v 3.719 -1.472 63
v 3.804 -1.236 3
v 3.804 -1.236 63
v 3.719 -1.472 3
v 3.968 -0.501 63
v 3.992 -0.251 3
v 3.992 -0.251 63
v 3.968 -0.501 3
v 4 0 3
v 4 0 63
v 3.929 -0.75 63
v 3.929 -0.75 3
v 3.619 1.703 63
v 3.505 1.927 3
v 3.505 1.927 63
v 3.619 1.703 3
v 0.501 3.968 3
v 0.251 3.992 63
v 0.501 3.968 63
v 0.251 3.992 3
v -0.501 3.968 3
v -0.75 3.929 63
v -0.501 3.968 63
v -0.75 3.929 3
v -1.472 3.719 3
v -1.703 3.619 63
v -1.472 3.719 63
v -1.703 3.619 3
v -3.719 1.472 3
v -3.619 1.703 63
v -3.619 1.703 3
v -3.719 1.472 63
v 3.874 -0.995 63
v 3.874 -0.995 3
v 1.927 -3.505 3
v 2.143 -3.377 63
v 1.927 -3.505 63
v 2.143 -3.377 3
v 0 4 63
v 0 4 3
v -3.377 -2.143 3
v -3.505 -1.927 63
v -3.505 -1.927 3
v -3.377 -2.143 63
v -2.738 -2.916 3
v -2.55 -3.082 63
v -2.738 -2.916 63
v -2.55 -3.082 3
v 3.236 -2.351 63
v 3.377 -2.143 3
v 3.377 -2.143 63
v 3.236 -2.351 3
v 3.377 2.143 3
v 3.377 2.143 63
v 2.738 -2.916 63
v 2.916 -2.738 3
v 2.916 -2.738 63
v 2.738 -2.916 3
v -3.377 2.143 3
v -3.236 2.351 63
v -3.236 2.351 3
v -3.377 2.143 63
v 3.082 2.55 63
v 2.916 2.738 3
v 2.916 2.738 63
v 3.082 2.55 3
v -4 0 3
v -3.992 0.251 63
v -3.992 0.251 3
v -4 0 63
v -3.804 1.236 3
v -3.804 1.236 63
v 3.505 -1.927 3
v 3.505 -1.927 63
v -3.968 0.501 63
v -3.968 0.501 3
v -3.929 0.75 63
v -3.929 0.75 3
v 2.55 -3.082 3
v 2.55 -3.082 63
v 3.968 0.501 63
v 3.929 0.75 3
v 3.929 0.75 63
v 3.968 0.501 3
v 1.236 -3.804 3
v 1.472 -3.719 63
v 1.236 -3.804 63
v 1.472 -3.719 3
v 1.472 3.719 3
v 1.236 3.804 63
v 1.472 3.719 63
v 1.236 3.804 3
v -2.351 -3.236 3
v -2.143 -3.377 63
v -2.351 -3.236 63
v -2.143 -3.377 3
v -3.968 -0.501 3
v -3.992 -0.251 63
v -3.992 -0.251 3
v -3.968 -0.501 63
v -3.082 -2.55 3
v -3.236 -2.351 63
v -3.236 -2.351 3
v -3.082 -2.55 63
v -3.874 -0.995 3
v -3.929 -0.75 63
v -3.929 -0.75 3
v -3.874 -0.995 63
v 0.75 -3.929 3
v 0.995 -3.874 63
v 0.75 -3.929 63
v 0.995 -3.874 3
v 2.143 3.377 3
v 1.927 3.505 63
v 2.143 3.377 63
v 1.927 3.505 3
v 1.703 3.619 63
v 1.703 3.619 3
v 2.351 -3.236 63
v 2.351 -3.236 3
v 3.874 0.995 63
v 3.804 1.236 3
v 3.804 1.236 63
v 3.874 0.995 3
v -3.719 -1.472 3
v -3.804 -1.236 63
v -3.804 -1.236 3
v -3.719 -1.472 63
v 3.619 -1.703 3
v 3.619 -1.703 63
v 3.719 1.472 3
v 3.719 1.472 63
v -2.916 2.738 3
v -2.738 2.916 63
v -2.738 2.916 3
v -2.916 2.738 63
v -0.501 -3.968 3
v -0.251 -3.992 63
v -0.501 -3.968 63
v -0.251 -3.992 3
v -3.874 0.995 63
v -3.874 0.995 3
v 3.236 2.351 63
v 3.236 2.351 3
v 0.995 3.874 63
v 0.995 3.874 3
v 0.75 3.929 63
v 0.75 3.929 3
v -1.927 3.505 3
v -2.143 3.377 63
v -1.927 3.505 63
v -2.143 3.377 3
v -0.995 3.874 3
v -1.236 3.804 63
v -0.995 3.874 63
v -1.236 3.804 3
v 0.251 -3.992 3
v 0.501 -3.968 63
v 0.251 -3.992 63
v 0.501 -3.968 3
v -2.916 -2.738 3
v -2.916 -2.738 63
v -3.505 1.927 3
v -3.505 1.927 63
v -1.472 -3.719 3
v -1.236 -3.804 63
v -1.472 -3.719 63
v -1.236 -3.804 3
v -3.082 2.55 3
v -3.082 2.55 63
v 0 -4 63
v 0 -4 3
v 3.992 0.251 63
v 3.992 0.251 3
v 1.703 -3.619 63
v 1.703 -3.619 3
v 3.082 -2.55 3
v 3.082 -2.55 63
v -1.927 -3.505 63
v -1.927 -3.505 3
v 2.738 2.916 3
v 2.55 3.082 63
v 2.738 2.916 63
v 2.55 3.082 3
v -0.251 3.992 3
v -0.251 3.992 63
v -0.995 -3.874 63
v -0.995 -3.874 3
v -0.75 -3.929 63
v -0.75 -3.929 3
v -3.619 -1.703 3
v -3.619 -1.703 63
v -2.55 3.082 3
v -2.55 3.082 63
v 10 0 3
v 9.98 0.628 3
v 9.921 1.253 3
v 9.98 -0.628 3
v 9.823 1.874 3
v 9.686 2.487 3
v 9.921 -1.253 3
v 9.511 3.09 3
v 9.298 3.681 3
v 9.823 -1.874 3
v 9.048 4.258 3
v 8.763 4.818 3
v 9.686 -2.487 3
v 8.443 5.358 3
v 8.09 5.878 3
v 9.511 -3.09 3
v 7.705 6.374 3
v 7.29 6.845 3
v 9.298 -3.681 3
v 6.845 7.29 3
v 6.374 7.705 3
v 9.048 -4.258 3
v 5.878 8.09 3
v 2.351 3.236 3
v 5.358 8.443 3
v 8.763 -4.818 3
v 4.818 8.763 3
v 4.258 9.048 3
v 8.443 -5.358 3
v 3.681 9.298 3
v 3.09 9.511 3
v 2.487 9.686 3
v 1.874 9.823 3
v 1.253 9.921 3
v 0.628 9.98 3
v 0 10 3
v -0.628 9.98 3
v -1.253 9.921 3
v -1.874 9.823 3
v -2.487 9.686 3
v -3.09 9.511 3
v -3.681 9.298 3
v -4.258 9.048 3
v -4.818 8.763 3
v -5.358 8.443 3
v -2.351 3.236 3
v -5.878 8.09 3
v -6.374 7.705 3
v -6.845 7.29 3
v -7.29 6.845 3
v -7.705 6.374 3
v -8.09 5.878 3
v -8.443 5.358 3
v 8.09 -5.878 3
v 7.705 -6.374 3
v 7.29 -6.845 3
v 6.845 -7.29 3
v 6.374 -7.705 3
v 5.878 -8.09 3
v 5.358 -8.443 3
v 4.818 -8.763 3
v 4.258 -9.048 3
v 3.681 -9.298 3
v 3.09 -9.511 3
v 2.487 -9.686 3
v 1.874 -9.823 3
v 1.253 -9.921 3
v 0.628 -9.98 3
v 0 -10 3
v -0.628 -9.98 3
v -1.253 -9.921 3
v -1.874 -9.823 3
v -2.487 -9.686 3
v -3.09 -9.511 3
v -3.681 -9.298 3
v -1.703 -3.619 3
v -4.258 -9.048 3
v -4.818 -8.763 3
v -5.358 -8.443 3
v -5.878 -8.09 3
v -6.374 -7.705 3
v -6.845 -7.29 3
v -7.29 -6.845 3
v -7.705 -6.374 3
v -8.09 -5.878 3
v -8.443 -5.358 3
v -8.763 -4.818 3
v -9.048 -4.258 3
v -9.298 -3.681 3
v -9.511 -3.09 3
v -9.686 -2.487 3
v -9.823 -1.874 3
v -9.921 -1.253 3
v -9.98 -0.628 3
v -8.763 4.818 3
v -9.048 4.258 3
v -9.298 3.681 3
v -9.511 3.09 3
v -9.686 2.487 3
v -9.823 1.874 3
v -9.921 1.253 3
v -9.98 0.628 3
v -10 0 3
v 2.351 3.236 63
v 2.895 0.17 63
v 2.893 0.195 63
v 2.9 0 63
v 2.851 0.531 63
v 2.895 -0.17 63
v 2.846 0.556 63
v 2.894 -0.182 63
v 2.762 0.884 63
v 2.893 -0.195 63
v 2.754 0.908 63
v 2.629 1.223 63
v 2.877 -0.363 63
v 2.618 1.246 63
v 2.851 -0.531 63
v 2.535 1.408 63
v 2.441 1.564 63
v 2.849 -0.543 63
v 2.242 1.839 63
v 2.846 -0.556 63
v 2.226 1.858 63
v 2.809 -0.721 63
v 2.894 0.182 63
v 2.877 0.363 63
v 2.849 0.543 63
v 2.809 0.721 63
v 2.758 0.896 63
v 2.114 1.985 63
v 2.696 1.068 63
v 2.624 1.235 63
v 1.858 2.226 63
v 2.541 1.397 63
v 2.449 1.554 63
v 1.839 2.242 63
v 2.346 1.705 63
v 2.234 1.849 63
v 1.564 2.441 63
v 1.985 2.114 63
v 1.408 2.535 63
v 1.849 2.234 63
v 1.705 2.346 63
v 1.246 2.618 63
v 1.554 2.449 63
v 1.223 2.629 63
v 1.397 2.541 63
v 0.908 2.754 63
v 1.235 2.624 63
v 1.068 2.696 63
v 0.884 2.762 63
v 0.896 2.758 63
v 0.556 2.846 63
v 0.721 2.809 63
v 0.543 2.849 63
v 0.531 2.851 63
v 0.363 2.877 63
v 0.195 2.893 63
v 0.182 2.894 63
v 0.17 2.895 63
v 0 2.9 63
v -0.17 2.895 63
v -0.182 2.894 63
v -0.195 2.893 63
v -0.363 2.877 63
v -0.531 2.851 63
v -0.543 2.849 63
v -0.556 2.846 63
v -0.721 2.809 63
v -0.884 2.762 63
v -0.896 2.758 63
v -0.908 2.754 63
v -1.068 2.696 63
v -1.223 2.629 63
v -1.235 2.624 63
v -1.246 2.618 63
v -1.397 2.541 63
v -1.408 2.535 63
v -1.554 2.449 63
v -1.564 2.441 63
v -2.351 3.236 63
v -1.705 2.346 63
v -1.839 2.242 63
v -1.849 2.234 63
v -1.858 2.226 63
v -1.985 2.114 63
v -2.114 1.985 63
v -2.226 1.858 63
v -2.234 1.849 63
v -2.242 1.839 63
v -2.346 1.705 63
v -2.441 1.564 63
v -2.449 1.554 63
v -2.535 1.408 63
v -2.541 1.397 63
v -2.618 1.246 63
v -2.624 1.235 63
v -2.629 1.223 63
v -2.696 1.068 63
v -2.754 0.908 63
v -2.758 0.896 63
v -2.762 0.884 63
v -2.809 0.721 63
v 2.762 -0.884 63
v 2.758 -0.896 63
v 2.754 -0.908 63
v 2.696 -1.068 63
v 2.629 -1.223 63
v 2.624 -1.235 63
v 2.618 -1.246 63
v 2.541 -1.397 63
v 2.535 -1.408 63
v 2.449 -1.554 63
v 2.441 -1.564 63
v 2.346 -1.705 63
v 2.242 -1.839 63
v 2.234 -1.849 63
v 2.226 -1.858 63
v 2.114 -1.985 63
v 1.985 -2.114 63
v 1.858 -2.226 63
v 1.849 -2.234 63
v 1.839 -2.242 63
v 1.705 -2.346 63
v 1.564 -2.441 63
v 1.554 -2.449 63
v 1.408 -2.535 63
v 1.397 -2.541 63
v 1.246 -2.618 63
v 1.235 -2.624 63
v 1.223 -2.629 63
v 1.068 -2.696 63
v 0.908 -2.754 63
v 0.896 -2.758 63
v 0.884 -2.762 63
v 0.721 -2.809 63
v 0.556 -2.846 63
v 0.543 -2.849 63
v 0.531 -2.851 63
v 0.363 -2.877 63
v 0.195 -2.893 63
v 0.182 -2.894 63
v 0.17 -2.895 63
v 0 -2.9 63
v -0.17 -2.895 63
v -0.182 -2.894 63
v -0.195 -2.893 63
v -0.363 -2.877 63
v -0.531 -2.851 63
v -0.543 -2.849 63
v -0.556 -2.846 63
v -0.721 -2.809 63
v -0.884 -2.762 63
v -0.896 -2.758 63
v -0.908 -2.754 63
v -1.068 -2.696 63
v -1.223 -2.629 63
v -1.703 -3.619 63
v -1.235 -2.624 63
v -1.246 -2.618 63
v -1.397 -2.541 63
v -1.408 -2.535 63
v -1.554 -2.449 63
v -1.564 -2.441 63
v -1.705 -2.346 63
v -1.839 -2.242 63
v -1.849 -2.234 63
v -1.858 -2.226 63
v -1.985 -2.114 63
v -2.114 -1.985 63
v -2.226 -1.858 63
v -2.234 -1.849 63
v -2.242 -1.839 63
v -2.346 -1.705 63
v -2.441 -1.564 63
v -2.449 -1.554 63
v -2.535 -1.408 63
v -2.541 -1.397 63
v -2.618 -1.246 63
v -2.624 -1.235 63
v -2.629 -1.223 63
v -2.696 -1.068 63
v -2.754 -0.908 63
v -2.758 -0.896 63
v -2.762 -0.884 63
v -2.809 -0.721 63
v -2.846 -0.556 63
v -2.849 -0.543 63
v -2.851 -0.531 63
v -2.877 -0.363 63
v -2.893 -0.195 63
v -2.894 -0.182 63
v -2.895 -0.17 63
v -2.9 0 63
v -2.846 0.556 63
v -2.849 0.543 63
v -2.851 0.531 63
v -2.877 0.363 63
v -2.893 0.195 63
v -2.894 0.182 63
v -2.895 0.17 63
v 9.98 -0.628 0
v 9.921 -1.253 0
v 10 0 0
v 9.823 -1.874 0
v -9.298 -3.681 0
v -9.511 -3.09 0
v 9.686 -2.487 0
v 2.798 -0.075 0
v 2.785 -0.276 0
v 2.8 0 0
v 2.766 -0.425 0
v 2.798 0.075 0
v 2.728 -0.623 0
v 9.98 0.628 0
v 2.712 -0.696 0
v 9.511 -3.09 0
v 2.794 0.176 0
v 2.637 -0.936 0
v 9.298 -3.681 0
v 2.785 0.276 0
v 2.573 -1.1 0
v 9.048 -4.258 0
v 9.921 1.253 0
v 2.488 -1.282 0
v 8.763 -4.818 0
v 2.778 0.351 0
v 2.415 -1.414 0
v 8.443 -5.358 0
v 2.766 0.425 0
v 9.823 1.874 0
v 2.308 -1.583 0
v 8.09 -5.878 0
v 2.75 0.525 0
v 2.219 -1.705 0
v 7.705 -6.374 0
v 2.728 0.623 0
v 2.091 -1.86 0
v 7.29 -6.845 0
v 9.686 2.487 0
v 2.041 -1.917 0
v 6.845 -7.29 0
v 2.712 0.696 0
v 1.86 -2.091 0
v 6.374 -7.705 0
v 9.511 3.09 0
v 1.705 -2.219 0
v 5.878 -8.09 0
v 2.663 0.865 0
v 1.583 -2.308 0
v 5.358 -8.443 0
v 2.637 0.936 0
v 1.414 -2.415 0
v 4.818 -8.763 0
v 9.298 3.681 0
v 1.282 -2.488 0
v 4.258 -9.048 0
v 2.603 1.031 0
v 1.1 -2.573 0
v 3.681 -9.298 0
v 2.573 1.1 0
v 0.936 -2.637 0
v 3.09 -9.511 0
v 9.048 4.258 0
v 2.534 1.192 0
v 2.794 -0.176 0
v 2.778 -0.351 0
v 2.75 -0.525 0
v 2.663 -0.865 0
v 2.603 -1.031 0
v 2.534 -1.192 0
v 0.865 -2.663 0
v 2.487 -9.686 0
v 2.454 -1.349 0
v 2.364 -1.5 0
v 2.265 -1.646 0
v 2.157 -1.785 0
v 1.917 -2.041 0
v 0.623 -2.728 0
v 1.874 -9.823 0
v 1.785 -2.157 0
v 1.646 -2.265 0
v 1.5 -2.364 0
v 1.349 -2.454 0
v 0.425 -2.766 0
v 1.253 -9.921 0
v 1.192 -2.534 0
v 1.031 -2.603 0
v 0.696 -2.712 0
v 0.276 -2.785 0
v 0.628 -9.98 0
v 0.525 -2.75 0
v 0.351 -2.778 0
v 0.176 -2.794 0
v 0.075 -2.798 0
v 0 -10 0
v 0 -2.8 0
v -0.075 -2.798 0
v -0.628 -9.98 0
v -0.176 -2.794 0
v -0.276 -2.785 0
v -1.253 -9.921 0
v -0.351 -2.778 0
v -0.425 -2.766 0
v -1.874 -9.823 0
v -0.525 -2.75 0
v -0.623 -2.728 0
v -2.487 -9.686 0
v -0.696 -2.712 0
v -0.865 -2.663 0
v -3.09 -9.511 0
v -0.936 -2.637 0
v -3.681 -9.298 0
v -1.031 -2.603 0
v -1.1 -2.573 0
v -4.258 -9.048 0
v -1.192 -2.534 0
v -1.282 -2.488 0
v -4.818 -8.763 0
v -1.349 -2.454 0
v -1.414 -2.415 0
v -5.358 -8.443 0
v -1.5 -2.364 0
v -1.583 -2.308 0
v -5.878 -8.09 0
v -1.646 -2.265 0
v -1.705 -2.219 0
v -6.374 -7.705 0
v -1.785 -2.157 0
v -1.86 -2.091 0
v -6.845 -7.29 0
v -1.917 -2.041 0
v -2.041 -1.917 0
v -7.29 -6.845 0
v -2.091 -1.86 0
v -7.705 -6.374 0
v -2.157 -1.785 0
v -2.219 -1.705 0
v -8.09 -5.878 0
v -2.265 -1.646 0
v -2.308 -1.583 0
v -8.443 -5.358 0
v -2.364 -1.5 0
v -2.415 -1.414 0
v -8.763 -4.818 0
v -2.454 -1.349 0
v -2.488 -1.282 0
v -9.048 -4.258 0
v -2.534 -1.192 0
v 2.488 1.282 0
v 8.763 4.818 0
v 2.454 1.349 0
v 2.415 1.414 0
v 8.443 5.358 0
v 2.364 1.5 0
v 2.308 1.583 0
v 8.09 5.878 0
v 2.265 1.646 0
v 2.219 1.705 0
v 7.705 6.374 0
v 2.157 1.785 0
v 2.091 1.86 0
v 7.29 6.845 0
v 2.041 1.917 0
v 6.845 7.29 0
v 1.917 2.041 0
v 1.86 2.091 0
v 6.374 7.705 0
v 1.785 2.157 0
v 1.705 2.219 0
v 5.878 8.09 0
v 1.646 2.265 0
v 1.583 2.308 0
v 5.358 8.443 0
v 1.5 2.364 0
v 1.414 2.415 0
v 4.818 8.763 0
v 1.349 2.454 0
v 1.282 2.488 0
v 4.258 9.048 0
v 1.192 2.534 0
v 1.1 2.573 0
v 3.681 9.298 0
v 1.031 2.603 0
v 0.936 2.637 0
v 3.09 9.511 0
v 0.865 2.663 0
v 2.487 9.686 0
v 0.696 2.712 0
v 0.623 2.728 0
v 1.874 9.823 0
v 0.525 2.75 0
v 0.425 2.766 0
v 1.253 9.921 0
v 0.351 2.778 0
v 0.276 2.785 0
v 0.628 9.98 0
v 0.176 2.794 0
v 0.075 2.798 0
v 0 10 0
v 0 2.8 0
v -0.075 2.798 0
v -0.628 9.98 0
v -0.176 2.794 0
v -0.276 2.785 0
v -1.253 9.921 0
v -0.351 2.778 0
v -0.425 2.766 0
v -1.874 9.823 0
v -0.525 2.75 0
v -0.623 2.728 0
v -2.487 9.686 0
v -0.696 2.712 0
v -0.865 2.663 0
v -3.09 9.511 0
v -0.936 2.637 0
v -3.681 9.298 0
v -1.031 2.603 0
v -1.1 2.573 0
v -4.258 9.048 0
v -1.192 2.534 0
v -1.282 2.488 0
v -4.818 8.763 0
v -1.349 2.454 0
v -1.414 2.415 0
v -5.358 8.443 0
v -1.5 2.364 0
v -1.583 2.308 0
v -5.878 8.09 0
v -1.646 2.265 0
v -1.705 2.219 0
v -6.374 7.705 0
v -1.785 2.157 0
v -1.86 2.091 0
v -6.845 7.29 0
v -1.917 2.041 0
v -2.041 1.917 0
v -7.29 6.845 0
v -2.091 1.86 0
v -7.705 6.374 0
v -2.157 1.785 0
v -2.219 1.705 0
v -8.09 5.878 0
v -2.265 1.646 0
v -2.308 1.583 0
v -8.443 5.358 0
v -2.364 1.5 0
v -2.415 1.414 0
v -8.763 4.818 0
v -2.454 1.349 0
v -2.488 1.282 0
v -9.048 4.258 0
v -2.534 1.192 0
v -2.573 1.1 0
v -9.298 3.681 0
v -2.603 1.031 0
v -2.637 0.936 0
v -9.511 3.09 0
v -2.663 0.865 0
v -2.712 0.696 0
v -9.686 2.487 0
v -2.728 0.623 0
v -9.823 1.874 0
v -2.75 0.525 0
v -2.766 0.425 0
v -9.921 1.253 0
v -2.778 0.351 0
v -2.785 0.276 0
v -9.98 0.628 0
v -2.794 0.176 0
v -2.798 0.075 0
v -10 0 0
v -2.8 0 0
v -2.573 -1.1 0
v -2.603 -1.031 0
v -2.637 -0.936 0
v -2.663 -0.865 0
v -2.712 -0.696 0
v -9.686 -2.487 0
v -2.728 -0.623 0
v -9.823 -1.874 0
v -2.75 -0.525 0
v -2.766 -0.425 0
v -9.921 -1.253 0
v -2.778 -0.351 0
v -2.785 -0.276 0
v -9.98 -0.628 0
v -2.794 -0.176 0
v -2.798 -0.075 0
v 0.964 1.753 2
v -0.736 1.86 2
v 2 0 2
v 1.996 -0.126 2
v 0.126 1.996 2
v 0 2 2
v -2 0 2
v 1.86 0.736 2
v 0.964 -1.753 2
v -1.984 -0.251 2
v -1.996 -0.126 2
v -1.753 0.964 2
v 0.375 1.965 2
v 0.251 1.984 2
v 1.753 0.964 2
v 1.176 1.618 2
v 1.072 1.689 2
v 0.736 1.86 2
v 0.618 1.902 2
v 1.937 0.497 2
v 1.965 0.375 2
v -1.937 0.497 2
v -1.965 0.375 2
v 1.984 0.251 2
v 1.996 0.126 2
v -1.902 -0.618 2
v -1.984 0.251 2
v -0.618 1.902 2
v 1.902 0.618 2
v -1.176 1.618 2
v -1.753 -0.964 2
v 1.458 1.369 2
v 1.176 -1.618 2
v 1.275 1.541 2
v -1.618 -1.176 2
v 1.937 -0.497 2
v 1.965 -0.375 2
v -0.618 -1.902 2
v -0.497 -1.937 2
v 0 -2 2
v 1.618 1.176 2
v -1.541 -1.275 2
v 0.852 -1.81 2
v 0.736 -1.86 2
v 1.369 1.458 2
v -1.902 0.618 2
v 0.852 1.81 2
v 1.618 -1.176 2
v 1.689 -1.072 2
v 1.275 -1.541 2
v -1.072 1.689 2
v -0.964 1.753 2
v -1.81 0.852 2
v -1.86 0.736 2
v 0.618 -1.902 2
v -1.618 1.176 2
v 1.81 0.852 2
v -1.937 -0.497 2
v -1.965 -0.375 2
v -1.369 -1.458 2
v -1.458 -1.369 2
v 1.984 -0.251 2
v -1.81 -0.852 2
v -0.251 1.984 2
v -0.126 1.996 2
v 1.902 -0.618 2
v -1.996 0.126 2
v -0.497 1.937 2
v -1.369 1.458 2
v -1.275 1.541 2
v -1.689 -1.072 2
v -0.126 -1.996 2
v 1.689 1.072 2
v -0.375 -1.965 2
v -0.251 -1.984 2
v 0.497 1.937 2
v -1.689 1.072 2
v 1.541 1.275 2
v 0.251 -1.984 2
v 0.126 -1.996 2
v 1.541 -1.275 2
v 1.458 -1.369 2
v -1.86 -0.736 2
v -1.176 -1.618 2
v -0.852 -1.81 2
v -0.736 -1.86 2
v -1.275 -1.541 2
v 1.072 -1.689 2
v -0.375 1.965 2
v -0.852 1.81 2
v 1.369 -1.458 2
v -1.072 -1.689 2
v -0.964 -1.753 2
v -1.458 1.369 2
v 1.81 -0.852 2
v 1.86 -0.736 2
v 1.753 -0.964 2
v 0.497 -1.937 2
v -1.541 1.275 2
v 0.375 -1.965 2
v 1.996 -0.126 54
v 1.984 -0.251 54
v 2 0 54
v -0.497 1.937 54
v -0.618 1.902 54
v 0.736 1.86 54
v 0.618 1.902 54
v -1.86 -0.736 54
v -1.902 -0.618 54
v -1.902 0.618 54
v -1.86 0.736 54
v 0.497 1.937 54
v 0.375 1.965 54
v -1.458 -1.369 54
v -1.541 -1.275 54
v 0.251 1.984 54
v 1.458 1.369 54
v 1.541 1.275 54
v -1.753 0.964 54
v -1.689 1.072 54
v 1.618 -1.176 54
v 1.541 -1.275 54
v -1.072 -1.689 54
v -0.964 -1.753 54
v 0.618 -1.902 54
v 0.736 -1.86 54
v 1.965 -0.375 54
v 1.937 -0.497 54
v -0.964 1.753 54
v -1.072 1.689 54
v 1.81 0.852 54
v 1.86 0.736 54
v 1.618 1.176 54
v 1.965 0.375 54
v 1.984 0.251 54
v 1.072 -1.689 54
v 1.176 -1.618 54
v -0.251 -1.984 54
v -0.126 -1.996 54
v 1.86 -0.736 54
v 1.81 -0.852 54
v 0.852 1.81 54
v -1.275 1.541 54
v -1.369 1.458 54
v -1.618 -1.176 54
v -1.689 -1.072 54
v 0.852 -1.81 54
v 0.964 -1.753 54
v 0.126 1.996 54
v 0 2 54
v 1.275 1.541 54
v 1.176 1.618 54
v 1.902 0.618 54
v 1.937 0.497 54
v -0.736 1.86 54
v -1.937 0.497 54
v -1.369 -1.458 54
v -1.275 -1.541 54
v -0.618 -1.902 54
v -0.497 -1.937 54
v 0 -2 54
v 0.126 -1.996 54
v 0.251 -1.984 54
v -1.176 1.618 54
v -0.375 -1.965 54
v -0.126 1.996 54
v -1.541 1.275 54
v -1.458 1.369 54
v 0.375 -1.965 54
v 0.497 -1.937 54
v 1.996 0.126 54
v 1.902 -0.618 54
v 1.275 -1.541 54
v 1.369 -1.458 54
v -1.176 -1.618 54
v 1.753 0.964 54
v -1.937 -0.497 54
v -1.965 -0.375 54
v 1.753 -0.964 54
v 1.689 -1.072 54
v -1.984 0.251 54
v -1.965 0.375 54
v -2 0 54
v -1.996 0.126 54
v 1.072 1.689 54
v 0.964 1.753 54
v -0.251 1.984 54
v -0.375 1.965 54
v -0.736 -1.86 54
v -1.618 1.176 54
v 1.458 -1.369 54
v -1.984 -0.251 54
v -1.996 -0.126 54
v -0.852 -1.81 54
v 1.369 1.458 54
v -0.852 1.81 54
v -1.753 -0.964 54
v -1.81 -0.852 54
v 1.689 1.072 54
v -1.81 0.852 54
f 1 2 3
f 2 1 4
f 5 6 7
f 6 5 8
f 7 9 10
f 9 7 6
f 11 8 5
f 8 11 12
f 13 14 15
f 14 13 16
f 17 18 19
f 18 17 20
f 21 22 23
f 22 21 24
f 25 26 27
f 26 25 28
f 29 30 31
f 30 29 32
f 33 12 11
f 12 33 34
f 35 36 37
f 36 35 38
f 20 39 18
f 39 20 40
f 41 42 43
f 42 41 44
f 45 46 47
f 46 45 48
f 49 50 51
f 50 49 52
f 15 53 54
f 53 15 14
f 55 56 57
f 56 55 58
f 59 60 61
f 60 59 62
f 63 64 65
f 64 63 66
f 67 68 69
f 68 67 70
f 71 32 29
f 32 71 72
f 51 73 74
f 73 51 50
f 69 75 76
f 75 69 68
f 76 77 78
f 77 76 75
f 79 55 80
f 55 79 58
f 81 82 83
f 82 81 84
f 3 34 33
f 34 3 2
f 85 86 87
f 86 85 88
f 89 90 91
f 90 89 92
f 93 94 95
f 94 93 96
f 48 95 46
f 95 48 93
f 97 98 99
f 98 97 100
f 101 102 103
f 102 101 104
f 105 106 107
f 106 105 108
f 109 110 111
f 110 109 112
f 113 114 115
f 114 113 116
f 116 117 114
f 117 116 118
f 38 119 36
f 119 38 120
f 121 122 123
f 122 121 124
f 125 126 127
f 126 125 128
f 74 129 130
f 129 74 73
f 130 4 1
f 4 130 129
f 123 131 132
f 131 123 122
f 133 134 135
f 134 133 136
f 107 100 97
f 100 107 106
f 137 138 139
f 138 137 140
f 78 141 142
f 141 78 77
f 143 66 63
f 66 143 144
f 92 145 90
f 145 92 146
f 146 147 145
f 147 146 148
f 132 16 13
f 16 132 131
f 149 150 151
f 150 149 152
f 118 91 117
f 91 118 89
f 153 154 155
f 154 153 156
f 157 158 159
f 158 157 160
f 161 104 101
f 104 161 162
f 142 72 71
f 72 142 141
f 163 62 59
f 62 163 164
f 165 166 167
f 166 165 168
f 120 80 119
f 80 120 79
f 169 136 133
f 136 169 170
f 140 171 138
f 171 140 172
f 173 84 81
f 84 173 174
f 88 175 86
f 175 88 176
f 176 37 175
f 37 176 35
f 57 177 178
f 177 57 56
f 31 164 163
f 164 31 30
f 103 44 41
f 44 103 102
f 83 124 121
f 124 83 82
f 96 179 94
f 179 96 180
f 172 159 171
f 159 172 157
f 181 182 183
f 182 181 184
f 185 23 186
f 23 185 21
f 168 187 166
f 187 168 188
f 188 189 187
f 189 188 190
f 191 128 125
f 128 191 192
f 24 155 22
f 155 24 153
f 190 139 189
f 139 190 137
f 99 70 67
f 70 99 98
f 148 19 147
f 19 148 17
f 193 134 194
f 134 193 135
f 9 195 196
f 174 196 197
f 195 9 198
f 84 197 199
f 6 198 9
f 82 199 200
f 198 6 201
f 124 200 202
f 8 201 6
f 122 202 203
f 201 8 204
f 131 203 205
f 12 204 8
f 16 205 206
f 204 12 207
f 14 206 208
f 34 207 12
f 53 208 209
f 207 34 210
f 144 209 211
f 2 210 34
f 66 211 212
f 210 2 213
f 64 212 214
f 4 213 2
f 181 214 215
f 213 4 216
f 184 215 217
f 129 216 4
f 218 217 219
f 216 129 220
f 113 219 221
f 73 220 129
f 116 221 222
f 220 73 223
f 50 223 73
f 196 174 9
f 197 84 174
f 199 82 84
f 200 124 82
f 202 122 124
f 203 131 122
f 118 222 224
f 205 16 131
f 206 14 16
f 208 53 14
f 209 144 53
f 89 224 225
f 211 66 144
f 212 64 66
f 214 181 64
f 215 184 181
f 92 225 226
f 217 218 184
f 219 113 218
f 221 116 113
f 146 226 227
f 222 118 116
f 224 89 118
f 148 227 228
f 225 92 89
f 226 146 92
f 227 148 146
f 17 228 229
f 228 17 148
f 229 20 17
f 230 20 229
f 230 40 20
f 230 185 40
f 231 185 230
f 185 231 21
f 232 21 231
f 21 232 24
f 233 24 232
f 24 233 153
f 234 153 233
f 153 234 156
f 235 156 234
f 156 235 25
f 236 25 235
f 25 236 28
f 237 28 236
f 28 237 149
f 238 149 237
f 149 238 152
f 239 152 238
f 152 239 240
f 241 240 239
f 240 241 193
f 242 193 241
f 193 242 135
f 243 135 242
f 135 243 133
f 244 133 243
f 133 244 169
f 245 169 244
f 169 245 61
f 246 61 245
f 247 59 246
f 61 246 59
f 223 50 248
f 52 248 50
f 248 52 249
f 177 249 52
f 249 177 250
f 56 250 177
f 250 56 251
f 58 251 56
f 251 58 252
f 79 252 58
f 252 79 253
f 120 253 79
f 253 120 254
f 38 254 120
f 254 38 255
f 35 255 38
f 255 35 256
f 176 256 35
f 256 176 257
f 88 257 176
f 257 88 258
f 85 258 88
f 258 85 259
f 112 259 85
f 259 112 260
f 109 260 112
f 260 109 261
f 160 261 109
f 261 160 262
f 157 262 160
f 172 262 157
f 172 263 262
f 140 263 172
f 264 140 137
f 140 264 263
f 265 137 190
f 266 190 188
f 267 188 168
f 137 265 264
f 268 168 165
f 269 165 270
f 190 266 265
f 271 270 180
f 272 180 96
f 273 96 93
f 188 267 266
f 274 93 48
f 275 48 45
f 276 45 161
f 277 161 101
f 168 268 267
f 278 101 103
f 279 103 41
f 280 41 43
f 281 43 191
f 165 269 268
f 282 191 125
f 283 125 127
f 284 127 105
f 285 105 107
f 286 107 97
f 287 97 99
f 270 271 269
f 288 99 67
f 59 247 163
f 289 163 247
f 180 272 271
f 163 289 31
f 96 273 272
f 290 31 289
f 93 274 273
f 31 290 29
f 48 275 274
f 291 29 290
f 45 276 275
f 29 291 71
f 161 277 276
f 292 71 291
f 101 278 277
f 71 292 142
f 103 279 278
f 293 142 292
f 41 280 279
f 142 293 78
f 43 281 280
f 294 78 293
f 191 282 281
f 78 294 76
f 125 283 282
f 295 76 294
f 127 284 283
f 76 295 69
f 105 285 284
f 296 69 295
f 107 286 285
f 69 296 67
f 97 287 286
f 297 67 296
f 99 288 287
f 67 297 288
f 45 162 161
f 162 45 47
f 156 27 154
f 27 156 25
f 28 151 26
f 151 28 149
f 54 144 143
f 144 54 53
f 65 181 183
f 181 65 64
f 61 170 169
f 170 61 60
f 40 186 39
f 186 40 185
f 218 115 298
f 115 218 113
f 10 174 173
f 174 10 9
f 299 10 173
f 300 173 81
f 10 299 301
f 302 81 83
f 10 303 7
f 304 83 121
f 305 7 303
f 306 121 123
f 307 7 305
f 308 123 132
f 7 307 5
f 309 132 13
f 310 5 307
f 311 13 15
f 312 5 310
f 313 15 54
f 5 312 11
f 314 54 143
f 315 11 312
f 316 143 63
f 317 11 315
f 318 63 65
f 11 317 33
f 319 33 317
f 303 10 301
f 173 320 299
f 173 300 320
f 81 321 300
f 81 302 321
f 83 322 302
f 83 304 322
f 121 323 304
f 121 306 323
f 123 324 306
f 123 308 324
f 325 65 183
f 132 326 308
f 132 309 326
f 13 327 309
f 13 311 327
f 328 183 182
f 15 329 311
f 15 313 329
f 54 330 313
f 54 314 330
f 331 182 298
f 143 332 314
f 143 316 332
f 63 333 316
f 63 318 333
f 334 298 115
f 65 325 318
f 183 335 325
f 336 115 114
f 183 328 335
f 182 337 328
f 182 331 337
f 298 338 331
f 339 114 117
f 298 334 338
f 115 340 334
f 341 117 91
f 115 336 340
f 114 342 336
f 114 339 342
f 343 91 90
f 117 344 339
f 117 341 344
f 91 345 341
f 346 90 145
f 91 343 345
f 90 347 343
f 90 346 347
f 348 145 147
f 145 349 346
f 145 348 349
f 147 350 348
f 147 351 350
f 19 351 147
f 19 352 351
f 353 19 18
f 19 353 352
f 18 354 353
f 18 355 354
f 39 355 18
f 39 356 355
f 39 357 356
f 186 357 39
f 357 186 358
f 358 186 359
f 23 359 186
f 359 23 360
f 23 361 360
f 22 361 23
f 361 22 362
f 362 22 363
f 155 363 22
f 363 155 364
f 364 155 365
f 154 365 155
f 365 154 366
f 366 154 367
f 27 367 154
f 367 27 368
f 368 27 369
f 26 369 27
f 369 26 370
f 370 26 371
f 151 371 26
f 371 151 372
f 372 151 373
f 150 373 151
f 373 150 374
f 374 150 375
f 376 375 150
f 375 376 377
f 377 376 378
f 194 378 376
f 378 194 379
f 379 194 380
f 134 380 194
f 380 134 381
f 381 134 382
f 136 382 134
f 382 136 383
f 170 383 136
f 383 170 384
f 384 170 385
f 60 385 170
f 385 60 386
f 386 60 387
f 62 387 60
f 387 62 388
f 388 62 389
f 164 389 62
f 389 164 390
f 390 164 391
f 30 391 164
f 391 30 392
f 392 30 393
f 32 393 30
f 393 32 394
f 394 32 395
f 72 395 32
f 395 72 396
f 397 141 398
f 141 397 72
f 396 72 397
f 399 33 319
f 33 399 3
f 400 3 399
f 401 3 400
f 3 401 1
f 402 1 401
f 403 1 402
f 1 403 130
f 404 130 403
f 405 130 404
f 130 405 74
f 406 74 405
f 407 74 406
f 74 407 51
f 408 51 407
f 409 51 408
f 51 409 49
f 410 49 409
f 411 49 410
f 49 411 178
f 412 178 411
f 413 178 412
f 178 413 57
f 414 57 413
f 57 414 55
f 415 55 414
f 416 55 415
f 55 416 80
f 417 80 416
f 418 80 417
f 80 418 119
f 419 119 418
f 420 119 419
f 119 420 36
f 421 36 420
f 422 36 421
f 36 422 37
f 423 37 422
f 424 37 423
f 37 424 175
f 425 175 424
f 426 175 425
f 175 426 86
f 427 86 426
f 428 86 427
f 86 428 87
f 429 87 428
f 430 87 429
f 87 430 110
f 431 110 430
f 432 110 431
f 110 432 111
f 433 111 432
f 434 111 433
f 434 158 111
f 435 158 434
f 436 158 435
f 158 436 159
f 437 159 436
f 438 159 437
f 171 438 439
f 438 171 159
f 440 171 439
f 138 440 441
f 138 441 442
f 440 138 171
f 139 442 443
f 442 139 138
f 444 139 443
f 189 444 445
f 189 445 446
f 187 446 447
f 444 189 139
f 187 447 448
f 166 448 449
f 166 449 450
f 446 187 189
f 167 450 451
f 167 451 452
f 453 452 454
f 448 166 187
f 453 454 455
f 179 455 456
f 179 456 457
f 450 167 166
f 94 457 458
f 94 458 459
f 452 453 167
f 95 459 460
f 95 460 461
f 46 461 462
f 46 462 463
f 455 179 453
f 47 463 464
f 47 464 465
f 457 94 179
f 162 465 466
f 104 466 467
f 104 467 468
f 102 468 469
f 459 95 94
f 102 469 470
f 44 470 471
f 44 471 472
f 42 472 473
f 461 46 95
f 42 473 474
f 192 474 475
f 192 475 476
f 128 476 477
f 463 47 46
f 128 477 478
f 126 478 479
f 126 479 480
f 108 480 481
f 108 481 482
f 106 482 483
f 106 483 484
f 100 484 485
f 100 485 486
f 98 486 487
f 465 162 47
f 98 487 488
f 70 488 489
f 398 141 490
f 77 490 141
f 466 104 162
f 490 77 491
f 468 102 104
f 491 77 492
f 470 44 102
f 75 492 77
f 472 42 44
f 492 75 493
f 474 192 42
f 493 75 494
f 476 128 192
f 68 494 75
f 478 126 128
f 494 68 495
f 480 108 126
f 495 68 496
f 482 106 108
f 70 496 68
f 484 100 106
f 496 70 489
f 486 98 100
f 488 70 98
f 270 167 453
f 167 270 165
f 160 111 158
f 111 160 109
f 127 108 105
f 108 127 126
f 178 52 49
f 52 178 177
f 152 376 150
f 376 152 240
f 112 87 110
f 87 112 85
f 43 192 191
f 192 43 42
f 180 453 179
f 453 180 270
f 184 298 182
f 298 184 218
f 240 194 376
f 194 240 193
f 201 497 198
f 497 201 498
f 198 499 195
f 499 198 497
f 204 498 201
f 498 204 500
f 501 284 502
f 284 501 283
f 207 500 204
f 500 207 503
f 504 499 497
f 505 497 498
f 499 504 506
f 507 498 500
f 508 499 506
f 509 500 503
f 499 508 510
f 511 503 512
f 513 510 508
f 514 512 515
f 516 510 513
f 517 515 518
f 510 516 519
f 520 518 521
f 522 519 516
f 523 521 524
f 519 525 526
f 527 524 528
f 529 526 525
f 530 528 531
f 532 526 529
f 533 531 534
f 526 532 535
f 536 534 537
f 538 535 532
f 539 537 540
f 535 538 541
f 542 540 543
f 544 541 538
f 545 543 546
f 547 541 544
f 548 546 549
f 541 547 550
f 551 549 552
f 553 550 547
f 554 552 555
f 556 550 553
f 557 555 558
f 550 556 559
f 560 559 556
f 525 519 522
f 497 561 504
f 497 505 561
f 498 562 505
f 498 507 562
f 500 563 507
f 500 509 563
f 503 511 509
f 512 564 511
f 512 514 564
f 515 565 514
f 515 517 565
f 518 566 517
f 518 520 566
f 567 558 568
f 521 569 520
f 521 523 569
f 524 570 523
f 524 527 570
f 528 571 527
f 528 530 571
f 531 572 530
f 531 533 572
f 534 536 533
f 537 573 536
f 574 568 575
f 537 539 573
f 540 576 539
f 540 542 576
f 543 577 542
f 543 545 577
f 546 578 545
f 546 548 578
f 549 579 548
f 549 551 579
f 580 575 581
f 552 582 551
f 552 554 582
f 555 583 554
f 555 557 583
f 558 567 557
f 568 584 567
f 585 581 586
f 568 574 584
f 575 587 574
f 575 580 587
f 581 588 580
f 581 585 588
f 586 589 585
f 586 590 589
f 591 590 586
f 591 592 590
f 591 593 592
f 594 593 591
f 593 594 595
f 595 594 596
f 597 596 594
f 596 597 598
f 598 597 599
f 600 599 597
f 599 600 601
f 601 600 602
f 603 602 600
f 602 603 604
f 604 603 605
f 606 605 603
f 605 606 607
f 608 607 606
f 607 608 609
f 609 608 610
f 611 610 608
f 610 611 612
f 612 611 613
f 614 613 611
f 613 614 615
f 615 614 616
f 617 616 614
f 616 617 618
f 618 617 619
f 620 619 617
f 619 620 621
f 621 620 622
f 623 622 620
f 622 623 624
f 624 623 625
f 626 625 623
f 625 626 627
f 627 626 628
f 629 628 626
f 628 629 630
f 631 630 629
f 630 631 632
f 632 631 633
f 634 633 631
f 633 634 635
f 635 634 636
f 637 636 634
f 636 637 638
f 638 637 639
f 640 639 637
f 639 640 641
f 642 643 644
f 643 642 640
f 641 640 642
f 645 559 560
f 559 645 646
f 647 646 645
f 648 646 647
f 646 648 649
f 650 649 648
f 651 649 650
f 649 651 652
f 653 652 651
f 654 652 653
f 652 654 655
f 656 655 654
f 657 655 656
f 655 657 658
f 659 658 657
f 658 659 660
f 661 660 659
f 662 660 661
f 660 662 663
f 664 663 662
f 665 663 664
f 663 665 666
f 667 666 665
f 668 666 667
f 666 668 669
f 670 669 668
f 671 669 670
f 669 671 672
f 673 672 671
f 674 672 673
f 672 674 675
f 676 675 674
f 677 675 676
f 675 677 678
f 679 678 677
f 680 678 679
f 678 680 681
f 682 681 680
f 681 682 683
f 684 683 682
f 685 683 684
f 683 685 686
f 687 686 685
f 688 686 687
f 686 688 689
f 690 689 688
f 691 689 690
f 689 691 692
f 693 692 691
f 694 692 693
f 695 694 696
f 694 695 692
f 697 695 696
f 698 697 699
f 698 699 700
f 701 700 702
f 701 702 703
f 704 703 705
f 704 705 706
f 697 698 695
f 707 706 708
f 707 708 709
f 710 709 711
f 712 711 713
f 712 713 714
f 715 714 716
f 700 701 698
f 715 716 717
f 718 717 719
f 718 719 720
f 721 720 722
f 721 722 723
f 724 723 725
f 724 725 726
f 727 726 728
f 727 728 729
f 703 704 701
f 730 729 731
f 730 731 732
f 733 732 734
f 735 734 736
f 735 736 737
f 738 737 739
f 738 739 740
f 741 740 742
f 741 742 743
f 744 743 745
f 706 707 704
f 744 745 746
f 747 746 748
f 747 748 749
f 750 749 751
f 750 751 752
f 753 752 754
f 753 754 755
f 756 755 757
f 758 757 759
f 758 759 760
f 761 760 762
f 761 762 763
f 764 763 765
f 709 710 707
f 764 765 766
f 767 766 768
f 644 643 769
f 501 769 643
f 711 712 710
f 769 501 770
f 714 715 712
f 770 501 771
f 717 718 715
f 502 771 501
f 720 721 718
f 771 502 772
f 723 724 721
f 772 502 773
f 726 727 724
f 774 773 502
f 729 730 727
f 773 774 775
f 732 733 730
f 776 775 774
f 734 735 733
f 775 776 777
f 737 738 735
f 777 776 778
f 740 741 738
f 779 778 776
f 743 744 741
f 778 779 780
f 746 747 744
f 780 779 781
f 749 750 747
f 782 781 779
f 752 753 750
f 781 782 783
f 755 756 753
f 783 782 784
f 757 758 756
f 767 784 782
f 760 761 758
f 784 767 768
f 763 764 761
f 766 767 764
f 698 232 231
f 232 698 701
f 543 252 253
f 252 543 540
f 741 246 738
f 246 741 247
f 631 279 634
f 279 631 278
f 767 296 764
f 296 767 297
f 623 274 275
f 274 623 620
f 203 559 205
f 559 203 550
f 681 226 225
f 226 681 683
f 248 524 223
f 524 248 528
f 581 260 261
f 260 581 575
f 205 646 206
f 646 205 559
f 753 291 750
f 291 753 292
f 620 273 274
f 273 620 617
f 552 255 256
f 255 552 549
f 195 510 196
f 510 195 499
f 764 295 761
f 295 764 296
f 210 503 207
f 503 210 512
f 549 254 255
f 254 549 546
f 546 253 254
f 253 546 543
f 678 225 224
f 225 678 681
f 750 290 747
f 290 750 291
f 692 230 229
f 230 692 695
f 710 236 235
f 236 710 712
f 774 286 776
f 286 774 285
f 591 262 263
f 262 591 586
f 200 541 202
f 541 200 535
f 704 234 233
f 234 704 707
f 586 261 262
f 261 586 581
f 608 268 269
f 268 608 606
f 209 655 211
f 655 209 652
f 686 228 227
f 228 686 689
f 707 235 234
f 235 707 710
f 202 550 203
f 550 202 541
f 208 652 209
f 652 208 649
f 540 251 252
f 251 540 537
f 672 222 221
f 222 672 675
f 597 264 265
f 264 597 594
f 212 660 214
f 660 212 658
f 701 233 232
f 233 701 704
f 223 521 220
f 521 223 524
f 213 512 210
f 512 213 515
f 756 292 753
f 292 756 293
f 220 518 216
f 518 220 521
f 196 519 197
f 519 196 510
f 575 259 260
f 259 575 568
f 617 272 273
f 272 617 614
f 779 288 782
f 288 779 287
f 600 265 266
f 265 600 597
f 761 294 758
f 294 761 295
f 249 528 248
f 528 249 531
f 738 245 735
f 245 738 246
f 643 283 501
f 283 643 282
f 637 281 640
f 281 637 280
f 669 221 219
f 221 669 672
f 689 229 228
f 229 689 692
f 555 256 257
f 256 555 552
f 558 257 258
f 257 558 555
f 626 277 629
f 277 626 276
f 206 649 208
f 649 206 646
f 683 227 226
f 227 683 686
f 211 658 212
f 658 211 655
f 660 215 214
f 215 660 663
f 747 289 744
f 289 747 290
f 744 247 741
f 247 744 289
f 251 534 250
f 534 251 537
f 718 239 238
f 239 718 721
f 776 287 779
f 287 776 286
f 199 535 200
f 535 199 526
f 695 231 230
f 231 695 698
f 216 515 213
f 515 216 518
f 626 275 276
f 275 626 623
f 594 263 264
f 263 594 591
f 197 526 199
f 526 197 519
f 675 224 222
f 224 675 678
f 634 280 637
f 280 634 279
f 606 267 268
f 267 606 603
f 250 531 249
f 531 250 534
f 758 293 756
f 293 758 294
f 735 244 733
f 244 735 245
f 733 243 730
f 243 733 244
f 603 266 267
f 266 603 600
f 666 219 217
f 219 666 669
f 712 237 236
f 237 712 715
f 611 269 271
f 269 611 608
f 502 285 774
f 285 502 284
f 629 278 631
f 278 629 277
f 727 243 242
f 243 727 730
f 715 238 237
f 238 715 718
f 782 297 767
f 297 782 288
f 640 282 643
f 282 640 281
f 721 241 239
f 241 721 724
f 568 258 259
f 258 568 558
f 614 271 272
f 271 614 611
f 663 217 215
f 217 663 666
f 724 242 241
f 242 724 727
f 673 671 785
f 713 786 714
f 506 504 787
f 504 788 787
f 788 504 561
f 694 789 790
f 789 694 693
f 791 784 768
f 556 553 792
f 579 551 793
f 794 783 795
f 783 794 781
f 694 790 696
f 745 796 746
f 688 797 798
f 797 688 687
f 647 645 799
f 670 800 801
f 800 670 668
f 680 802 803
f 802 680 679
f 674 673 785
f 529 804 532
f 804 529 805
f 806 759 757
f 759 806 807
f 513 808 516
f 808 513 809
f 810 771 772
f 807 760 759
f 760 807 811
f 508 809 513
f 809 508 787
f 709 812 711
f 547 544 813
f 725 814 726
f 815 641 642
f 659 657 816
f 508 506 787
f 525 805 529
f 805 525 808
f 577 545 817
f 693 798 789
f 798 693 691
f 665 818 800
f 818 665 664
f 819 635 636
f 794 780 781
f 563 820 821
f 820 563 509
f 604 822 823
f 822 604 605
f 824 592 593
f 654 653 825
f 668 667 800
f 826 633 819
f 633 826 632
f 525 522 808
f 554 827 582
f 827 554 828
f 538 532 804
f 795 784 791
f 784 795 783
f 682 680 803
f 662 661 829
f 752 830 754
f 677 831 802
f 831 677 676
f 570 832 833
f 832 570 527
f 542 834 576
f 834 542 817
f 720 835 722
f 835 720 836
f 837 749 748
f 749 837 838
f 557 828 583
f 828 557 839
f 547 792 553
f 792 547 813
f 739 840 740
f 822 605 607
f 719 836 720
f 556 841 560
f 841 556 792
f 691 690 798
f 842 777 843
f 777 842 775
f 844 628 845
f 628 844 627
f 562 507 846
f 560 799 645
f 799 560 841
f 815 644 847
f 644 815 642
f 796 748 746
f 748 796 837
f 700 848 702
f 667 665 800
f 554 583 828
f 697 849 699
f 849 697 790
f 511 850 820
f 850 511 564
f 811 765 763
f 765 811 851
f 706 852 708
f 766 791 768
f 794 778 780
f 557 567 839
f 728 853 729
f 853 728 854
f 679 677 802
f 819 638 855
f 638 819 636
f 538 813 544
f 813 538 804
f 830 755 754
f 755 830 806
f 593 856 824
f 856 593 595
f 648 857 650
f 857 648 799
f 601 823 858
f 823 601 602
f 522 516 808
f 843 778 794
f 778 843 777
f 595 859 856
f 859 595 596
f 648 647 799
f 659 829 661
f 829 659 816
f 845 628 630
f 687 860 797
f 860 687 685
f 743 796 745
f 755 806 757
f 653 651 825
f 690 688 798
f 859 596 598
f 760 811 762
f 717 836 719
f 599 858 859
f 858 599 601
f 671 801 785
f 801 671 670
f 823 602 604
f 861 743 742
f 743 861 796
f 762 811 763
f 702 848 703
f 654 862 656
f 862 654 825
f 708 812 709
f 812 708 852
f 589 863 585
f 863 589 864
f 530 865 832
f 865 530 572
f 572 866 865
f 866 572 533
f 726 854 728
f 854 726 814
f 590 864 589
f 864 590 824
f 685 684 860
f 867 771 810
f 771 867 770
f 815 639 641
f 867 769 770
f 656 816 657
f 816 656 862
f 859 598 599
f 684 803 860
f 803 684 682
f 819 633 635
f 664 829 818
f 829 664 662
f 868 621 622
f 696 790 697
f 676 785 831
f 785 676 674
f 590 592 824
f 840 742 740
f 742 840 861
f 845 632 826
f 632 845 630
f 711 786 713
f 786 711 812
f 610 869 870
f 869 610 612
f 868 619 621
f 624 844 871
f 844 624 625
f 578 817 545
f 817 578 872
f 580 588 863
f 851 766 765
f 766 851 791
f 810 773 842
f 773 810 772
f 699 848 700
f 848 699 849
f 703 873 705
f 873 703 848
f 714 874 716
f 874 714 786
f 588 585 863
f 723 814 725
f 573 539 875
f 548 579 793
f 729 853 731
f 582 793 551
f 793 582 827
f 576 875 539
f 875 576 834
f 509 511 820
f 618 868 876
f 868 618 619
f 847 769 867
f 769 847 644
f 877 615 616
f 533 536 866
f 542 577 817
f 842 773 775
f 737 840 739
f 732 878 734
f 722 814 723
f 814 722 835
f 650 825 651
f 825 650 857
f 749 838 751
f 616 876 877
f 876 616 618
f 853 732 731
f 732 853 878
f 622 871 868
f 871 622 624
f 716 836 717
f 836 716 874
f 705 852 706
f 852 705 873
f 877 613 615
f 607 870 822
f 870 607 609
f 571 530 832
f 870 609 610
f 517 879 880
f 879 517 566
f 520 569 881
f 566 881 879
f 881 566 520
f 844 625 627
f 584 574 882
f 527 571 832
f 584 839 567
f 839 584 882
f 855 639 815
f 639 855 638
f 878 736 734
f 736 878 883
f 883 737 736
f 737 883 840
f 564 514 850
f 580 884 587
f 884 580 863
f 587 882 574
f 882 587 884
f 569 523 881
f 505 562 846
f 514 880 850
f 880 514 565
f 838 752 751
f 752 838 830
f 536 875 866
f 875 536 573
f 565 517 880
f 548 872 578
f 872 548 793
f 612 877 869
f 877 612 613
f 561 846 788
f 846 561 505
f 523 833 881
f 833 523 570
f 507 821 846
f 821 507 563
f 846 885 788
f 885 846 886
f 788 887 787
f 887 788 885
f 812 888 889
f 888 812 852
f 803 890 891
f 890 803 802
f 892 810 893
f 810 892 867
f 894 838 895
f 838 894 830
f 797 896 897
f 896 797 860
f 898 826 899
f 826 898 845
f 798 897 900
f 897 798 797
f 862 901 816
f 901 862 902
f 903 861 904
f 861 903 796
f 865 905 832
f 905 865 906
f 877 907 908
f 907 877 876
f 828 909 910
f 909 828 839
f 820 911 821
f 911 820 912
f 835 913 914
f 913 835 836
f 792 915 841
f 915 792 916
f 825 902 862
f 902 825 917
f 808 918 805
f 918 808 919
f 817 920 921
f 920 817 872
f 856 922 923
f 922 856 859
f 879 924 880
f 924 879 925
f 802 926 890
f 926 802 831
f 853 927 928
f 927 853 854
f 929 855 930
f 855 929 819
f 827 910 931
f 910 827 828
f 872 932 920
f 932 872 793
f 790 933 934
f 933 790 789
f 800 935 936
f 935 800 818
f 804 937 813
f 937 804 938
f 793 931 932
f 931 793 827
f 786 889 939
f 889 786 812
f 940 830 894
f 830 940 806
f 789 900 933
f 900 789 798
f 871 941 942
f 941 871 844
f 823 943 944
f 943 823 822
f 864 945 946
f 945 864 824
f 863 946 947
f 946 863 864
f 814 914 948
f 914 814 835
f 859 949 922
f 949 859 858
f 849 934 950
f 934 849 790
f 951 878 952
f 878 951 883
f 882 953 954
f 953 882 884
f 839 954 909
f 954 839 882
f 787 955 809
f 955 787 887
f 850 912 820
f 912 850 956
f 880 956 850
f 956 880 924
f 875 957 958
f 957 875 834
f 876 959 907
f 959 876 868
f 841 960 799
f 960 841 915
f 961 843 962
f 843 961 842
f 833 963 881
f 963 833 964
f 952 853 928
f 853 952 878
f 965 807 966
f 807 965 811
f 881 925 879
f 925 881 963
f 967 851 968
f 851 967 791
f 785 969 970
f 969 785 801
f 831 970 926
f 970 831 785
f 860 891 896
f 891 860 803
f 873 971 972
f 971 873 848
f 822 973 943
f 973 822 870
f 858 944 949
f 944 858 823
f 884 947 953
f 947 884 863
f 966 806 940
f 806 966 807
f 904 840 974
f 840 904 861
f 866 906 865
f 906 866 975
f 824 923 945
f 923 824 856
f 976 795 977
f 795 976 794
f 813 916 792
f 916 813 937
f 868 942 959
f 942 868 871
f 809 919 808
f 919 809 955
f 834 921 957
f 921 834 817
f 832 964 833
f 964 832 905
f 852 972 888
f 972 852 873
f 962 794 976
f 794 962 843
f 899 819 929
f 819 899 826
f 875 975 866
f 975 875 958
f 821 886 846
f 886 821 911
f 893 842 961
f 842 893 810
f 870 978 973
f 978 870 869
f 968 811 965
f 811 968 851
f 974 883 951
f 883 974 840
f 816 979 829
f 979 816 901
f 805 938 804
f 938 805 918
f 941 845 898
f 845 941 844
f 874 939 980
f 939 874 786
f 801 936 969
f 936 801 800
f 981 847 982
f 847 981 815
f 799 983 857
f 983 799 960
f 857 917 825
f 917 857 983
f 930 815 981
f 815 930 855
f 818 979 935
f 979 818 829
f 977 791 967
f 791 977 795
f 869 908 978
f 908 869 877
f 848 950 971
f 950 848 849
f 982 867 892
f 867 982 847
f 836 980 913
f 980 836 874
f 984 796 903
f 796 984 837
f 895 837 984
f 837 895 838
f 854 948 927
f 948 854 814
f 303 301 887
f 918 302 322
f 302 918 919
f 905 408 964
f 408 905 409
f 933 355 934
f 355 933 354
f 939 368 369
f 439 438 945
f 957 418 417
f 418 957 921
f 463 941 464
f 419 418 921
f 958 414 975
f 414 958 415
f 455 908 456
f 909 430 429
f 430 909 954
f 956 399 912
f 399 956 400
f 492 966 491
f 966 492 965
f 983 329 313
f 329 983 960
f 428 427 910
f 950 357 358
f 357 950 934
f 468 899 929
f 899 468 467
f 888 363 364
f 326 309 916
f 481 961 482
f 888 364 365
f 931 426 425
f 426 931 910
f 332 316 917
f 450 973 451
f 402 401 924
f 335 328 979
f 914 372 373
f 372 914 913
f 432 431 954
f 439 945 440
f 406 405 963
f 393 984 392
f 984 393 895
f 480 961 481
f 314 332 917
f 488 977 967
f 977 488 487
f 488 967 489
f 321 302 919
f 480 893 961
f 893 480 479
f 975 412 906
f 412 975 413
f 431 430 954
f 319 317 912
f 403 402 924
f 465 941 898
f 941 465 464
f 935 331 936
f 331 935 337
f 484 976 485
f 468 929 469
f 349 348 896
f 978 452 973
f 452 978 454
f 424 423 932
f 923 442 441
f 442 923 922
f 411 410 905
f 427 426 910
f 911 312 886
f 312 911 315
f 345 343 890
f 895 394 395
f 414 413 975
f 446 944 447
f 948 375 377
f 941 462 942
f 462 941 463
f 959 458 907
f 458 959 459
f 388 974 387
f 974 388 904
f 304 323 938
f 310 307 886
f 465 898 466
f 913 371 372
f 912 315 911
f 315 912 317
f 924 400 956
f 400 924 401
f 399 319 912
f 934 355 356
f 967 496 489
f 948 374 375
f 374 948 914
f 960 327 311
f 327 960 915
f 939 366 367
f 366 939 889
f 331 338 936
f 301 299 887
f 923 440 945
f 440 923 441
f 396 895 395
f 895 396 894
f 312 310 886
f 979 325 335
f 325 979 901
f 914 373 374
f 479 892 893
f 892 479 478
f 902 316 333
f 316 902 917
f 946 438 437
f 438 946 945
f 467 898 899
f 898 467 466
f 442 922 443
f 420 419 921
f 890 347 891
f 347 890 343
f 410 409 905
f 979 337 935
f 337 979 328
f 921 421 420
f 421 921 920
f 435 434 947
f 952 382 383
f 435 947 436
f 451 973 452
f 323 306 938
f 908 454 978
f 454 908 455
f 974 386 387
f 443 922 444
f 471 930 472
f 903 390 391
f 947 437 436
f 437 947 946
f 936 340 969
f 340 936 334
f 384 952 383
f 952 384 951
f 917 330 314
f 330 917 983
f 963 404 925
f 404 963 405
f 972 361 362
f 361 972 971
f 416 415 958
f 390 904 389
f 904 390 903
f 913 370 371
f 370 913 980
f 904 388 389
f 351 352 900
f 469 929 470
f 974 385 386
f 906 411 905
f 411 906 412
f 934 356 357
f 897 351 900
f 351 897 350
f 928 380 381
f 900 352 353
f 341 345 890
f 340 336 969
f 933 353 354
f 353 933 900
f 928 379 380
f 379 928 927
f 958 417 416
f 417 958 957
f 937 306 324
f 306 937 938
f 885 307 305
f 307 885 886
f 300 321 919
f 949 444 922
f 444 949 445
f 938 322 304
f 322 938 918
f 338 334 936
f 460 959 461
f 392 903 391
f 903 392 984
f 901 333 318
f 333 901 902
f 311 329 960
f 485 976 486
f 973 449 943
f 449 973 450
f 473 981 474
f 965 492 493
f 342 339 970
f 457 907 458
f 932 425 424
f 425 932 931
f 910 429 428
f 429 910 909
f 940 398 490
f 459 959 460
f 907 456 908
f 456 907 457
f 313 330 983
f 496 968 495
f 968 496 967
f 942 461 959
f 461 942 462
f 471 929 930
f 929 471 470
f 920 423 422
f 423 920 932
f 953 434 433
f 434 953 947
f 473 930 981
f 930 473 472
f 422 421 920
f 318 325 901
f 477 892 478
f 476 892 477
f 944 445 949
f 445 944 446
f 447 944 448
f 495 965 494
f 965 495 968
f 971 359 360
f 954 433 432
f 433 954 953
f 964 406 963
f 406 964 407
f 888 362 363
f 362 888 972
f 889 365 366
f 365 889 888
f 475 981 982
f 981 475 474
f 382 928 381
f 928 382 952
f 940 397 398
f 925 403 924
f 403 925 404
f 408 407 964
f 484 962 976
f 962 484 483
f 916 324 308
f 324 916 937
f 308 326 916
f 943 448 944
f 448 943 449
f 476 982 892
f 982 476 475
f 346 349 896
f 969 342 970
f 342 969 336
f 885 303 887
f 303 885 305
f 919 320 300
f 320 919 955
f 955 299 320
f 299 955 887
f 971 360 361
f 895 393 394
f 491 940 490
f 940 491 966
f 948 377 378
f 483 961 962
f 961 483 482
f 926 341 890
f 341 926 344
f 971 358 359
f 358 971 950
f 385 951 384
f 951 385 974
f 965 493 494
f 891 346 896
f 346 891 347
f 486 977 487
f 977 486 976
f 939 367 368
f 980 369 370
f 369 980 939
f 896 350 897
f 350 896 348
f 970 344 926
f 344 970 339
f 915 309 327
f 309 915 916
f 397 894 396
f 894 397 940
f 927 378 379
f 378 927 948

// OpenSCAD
guide_height = 60;
guide_radius = 8/2;
cap_height = 3;
cap_radius = 20/2;
hole_radius = 4/2;
//$fa = 0.01; $fs = 0.01;
$fn = 100;

translate([0, 0, guide_height+cap_height]) rotate(a=[180,0,0]) difference() {
    union() { // Cap
        cylinder(h=guide_height, r=guide_radius);
        translate([0,0,guide_height]) cylinder(h=cap_height, r=cap_radius);
    }
    union() { // Hole
        translate([0,0,guide_height+1]) cylinder(10, hole_radius, hole_radius*3);
        translate([0,0,-1]) cylinder(h=guide_height+cap_height+2, r=hole_radius);
        translate([0,0,-1]) cylinder(10, min(hole_radius*2, guide_radius-1), hole_radius);
    }
}
